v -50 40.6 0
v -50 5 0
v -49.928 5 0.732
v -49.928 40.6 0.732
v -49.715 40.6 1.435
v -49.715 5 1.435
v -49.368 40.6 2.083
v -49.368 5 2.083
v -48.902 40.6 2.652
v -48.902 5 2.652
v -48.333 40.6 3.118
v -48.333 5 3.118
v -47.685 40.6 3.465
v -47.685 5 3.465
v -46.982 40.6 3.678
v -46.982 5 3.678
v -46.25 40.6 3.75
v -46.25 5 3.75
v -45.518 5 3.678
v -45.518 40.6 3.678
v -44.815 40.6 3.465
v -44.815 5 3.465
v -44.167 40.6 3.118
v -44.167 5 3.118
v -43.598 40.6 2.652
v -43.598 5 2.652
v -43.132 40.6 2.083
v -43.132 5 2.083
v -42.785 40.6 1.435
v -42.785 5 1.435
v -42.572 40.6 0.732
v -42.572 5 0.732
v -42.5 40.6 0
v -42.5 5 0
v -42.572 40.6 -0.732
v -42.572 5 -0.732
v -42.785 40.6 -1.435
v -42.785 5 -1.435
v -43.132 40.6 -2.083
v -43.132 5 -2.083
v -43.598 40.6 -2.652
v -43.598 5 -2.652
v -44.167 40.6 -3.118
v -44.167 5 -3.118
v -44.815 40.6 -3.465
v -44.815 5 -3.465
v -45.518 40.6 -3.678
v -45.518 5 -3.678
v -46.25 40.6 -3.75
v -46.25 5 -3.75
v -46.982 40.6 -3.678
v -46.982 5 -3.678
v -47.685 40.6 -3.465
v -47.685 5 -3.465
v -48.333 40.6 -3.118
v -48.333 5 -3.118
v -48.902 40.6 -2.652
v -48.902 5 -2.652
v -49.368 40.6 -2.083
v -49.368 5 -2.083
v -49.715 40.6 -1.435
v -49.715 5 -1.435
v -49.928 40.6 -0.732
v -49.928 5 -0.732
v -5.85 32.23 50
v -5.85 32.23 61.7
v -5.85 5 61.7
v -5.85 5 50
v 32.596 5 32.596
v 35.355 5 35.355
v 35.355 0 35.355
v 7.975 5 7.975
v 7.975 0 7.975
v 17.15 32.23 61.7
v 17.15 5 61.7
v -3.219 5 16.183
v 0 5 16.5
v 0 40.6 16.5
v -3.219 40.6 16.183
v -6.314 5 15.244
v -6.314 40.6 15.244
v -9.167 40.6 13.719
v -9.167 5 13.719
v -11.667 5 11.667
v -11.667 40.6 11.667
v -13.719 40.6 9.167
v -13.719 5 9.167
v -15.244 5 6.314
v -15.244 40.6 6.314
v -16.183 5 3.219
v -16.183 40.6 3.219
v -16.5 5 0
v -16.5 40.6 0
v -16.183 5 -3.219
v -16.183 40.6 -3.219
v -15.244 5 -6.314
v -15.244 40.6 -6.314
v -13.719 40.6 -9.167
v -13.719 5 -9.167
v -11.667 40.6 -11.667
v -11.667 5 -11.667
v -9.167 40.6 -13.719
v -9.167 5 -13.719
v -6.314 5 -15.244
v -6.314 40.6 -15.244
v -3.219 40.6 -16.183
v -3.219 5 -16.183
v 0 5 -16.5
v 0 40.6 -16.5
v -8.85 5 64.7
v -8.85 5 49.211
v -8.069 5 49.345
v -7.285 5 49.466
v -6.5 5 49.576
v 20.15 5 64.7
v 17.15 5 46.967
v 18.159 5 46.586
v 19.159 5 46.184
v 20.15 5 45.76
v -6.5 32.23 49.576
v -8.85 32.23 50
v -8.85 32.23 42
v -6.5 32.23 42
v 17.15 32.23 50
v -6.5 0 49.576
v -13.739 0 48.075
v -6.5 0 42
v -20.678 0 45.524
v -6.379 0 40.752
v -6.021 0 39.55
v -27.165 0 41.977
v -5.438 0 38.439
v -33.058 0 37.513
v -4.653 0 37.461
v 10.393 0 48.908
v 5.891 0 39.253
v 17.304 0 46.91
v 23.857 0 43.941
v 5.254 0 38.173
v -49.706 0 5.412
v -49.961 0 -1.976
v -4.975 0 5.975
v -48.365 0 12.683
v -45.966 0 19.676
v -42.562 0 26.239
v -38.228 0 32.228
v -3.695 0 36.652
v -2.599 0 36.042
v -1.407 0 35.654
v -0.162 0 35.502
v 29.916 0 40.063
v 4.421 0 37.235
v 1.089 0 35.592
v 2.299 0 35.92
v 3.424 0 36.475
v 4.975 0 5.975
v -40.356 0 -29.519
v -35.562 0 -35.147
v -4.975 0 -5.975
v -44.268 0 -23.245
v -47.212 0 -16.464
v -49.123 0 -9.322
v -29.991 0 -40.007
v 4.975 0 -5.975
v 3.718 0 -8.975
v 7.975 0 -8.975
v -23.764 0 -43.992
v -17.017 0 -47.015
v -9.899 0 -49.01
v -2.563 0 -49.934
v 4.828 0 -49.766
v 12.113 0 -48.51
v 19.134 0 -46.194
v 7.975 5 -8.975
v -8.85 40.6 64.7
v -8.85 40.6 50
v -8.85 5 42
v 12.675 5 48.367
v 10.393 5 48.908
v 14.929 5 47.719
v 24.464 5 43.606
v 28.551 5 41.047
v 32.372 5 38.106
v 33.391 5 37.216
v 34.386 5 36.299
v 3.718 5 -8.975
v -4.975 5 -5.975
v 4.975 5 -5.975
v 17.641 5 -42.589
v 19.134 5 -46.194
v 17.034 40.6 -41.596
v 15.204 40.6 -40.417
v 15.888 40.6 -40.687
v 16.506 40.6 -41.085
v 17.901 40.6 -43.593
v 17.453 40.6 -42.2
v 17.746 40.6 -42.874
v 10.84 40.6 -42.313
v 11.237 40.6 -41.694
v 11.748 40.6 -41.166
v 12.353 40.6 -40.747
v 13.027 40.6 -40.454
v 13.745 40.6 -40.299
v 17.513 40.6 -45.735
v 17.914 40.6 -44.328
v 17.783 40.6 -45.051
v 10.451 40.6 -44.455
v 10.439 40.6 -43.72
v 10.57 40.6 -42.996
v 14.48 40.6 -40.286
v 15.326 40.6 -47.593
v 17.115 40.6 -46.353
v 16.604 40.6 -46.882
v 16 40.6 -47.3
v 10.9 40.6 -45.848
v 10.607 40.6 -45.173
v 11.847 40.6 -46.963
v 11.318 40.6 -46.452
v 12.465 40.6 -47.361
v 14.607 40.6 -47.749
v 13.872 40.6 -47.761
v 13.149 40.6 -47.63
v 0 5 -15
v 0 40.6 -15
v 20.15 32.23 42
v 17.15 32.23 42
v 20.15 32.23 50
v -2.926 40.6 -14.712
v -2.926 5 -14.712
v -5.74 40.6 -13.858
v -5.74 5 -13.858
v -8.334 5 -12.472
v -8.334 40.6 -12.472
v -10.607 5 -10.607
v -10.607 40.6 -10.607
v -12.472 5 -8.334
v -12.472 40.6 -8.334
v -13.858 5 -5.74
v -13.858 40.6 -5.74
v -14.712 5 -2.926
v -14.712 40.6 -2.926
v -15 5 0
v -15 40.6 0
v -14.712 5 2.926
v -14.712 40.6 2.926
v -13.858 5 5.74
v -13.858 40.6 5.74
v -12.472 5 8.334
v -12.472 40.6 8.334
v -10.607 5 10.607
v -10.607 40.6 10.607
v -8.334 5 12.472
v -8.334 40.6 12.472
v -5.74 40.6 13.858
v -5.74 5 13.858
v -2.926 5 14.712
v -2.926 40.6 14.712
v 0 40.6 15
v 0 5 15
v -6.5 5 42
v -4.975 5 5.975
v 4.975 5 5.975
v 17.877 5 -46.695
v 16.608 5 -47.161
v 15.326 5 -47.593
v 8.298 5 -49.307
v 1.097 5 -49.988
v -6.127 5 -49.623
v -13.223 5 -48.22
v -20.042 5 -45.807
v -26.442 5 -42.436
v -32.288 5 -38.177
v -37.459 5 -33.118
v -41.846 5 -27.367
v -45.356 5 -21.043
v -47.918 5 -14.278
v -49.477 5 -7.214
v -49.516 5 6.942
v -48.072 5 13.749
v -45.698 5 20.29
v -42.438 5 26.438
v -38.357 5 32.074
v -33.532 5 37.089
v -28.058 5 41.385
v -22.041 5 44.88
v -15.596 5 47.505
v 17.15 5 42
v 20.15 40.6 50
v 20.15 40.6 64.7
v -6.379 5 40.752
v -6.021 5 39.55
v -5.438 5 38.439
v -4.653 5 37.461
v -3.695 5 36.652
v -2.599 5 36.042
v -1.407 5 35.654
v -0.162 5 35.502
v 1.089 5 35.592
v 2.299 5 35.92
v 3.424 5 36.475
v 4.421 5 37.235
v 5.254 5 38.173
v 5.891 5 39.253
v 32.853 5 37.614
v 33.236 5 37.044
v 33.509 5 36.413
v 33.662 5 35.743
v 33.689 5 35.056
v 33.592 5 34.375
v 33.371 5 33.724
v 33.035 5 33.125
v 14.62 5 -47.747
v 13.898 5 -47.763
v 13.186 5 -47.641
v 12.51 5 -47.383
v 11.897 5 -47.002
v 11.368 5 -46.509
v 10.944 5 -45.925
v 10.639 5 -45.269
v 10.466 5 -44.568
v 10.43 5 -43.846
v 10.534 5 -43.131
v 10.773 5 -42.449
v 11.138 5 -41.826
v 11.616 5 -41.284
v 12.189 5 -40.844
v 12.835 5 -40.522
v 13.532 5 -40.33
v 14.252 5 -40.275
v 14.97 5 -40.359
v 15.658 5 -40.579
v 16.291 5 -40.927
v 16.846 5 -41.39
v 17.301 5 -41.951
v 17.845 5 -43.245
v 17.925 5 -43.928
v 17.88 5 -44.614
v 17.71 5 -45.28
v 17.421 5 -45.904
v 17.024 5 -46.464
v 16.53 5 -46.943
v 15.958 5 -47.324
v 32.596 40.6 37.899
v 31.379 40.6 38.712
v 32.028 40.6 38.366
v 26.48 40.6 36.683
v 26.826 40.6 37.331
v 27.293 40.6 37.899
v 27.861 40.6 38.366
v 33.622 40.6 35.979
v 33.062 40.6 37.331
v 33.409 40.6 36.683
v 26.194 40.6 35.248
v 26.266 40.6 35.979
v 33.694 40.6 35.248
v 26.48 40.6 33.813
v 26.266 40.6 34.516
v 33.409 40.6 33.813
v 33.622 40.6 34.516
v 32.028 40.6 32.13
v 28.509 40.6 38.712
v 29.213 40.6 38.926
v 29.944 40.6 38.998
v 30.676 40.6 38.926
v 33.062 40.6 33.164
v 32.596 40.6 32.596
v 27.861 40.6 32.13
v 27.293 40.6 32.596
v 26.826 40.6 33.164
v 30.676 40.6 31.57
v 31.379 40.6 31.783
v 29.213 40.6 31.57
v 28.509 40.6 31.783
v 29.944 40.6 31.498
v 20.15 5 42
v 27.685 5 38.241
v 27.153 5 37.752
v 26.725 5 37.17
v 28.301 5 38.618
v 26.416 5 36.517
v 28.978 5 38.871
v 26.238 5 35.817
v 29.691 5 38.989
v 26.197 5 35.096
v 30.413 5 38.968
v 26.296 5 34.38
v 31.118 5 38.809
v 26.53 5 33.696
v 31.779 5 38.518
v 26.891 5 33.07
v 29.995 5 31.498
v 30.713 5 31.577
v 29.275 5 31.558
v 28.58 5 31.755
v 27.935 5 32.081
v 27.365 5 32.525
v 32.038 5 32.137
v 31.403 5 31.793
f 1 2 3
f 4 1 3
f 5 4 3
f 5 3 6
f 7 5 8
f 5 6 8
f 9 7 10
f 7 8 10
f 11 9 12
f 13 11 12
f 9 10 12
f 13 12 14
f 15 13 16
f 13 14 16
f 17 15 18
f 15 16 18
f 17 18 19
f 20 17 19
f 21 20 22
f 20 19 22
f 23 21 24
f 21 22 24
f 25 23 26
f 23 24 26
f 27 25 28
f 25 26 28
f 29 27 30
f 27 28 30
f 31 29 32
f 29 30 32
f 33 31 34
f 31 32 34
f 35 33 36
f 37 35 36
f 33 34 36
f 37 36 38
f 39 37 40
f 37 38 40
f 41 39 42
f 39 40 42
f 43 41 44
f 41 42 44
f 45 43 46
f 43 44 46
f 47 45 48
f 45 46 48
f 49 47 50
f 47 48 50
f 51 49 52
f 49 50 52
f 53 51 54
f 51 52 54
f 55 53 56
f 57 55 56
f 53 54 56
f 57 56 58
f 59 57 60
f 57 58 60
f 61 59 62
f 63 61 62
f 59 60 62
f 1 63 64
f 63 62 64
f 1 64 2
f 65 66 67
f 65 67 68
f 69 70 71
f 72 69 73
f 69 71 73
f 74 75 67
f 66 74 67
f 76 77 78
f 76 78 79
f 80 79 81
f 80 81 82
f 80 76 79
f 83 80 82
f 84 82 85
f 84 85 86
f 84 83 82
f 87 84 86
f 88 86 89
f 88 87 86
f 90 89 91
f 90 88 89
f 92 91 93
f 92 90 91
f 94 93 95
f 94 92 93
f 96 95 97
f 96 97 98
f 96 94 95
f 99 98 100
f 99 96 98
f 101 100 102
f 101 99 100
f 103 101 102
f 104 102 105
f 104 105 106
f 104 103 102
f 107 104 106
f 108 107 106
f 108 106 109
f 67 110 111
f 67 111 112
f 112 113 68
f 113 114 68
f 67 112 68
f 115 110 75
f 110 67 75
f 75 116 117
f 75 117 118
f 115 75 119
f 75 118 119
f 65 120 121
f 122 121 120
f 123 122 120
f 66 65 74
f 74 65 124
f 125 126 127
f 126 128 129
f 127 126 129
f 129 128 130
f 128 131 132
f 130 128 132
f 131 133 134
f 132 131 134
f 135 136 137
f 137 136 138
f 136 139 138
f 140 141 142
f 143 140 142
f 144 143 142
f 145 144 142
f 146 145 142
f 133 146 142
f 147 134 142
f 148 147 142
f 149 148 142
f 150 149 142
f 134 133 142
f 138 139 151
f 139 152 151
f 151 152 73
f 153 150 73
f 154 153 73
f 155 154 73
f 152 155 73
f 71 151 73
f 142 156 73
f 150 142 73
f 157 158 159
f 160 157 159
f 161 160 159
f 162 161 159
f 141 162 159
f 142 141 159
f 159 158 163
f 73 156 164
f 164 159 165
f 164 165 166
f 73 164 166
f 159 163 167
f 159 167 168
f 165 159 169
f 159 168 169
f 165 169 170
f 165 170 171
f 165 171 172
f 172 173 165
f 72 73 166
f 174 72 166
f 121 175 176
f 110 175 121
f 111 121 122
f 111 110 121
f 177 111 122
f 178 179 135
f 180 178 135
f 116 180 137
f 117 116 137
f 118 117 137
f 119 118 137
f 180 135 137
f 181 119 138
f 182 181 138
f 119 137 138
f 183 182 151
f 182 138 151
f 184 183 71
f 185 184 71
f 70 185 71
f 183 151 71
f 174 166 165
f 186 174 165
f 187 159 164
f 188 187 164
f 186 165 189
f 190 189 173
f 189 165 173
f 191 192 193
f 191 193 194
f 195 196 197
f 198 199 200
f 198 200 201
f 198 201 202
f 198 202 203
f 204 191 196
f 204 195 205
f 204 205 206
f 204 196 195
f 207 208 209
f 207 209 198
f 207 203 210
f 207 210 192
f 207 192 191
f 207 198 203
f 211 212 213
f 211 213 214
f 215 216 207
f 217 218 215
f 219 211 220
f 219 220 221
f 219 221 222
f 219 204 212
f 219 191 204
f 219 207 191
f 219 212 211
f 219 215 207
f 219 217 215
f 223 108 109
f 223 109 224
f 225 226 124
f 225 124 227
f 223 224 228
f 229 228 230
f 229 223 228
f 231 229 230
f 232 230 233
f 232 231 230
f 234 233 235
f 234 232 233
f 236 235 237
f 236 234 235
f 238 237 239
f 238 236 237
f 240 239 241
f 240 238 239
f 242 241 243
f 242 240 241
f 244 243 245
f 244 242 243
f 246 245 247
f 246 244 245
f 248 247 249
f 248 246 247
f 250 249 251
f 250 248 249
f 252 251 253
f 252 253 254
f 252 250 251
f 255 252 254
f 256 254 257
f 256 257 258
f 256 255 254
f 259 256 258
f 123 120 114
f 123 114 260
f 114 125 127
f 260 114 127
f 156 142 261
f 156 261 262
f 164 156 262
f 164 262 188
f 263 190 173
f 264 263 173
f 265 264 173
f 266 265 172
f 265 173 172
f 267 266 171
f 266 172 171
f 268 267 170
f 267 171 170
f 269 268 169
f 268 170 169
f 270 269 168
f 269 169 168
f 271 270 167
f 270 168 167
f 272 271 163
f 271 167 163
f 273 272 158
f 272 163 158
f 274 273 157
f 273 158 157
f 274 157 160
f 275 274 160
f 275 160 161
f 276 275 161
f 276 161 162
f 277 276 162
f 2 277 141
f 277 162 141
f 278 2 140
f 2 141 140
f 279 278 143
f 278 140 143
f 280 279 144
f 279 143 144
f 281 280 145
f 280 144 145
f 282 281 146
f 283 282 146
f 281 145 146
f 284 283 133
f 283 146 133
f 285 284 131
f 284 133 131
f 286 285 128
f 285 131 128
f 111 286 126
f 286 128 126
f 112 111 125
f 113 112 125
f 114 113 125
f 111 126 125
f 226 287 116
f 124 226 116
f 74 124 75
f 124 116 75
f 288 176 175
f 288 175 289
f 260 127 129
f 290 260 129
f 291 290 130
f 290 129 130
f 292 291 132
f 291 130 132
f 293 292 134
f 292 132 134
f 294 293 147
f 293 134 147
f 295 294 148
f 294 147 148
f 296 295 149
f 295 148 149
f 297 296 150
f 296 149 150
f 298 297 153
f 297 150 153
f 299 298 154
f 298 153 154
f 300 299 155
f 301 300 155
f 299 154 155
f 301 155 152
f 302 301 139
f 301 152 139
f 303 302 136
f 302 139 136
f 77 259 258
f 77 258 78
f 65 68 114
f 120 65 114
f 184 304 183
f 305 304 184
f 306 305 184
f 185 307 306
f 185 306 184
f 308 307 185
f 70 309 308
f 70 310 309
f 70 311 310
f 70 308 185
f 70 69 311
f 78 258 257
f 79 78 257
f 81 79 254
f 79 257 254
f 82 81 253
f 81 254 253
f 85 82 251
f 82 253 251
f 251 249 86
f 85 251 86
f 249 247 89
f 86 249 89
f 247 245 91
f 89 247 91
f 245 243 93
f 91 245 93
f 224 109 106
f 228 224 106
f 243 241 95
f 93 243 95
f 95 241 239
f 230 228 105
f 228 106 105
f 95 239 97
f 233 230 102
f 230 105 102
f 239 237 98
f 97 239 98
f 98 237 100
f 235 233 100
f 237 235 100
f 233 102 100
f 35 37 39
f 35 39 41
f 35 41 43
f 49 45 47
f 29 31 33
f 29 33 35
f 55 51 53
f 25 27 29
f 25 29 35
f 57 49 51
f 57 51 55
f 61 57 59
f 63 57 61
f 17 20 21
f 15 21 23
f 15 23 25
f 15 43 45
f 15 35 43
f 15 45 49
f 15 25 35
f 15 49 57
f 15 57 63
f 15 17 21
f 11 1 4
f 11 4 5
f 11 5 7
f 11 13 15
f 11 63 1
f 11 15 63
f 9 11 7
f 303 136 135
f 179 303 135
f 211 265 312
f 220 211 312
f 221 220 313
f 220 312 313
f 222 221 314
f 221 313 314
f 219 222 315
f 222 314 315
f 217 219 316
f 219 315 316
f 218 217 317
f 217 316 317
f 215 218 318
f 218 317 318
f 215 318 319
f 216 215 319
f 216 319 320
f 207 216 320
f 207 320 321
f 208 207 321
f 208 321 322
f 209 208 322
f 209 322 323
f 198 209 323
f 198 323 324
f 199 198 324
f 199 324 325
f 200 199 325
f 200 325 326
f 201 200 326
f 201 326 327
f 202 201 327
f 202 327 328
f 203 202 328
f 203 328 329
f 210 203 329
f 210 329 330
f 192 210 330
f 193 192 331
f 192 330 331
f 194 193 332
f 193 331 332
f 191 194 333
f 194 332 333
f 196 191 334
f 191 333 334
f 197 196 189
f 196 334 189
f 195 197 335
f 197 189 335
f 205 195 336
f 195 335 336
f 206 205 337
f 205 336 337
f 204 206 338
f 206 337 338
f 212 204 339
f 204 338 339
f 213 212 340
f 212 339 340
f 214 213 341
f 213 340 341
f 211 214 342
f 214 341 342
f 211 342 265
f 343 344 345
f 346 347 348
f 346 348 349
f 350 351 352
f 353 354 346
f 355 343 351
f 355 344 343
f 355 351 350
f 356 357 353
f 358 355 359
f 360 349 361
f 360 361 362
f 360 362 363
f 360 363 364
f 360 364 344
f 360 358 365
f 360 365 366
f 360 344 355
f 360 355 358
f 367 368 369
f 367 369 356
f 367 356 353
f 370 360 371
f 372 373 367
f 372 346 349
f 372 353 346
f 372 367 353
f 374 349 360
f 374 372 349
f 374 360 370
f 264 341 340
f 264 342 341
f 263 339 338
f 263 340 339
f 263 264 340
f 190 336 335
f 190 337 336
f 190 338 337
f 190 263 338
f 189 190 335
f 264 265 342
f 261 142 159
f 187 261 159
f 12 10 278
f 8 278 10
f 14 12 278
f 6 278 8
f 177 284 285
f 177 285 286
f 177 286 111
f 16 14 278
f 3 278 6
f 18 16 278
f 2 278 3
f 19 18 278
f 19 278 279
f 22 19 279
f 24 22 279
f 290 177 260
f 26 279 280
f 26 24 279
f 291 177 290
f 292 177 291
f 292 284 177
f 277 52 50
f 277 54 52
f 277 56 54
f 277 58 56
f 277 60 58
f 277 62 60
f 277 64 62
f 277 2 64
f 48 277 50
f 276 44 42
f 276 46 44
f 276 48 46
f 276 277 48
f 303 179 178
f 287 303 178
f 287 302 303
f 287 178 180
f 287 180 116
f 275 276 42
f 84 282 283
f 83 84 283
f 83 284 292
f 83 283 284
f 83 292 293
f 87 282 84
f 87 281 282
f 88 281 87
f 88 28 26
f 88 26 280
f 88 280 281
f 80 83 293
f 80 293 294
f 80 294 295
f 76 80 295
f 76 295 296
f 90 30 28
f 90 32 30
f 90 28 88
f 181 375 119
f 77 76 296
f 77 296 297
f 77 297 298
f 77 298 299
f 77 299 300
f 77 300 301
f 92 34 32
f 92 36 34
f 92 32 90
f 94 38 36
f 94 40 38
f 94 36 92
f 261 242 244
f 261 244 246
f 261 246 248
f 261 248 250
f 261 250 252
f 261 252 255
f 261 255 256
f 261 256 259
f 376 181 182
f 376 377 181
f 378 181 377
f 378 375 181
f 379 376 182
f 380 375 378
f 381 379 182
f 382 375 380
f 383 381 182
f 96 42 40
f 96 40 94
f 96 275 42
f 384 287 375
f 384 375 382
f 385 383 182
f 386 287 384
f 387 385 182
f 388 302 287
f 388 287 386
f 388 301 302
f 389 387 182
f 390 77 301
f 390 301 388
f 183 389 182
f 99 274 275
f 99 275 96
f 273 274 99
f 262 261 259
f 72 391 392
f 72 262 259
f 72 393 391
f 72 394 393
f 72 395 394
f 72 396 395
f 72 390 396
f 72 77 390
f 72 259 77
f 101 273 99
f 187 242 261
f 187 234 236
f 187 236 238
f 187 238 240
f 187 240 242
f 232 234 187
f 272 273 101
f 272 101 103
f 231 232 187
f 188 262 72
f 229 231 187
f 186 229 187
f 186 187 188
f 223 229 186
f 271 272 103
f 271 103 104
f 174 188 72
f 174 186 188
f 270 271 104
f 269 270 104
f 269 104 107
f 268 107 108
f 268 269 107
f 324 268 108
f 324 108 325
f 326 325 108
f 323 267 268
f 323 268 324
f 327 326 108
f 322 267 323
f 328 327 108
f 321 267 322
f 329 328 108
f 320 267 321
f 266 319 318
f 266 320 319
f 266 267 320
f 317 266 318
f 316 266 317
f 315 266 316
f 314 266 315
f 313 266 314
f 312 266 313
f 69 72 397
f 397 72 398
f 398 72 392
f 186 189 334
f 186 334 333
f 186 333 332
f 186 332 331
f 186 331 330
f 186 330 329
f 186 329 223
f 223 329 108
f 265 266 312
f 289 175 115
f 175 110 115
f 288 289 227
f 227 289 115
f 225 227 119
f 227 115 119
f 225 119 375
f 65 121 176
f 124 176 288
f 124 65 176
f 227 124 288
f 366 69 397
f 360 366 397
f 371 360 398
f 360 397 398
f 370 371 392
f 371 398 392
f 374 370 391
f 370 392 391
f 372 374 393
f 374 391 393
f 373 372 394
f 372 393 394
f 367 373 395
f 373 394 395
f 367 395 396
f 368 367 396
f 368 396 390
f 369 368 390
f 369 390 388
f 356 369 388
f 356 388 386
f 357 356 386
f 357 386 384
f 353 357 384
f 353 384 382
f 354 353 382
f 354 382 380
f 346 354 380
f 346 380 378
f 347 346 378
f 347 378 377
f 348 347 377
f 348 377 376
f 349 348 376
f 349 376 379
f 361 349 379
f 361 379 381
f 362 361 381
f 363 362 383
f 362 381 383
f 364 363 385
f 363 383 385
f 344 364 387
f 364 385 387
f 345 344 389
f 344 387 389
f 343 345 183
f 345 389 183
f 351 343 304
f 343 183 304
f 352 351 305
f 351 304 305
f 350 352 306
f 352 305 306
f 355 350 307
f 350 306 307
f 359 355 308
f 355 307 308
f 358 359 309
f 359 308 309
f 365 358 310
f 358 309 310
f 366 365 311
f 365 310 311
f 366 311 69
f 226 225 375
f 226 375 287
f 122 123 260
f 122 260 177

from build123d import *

# Parameters (mm, degrees)
SKETCH1_W           = 9.95
SKETCH1_H           = 11.95
BOSS_EXTRUDE2_DEPTH = 5
BOSS_EXTRUDE4_DEPTH = 27.23
SKETCH3_W           = 29
SKETCH3_H           = 14.7
BOSS_EXTRUDE5_DEPTH = 3
BOSS_EXTRUDE6_DEPTH = 35.6
SKETCH7_W           = 29
SKETCH7_H           = 14.7
BOSS_EXTRUDE7_DEPTH = 5.37
SKETCH8_R           = 3.75
BOSS_EXTRUDE8_DEPTH = 35.6


with BuildPart() as part:
    # Sketch1 → Boss-Extrude2 (new body)
    with BuildSketch(Plane(origin=(0, 0, 0), x_dir=(1, 0, 0), z_dir=(0, 1, 0))):
        with BuildLine():
            Line((35.355339059, -35.355339059), (7.975, -7.975))
            Line((7.975, -7.975), (7.975, 8.975))
            Line((7.975, 8.975), (3.717566722, 8.975))
            Line((3.717566722, 8.975), (19.134171618, 46.193976626))
            ThreePointArc((19.134171618, 46.193976626), (-48.299723588, 12.928136036), (-6.5, -49.575699692))
            Line((-6.5, -49.575699692), (-6.5, -42))
            ThreePointArc((-6.5, -42), (-1.406857491, -35.654075954), (5.891000616, -39.252981299))
            Line((5.891000616, -39.252981299), (10.393160878, -48.907895139))
            ThreePointArc((10.393160878, -48.907895139), (23.856849241, -43.941446771), (35.355339059, -35.355339059))
        make_face()
        Rectangle(SKETCH1_W, SKETCH1_H, mode=Mode.SUBTRACT)
    extrude(amount=BOSS_EXTRUDE2_DEPTH)

    # Sketch2 → Boss-Extrude4 (add)
    with BuildSketch(Plane(origin=(0, 5, 0), x_dir=(1, 0, 0), z_dir=(0, 1, 0))):
        with BuildLine():
            Line((17.15, -61.7), (-5.85, -61.7))
            Line((-5.85, -61.7), (-5.85, -50))
            Line((-5.85, -50), (-6.5, -49.575699692))
            ThreePointArc((-6.5, -49.575699692), (-7.67717135, -49.407095038), (-8.85, -49.21054257))
            Line((-8.85, -49.21054257), (-8.85, -64.7))
            Line((-8.85, -64.7), (20.15, -64.7))
            Line((20.15, -64.7), (20.15, -50))
            Line((20.15, -50), (20.15, -45.759998907))
            ThreePointArc((20.15, -45.759998907), (18.65975815, -46.387643029), (17.15, -46.966770168))
            Line((17.15, -46.966770168), (17.15, -50))
            Line((17.15, -50), (17.15, -61.7))
        make_face()
        with BuildLine():
            ThreePointArc((-8.85, -49.21054257), (-7.67717135, -49.407095038), (-6.5, -49.575699692))
            Line((-6.5, -49.575699692), (-6.5, -42))
            Line((-6.5, -42), (-8.85, -42))
            Line((-8.85, -42), (-8.85, -49.21054257))
        make_face()
        with BuildLine():
            Line((17.15, -42), (17.15, -46.966770168))
            ThreePointArc((17.15, -46.966770168), (18.65975815, -46.387643029), (20.15, -45.759998907))
            Line((20.15, -45.759998907), (20.15, -42))
            Line((20.15, -42), (17.15, -42))
        make_face()
    extrude(amount=BOSS_EXTRUDE4_DEPTH)

    # Sketch3 → Boss-Extrude5 (add)
    with BuildSketch(Plane(origin=(0, 32.23, 0), x_dir=(1, 0, 0), z_dir=(0, 1, 0))):
        with Locations((5.65, -57.35)):
            Rectangle(SKETCH3_W, SKETCH3_H)
    extrude(amount=BOSS_EXTRUDE5_DEPTH)

    # Sketch4 → Boss-Extrude6 (add)
    with BuildSketch(Plane(origin=(0, 5, 0), x_dir=(1, 0, 0), z_dir=(0, 1, 0))):
        with BuildLine():
            Line((0, 16.5), (0, 15))
            ThreePointArc((0, 15), (-15, 0), (0, -15))
            Line((0, -15), (0, -16.5))
            ThreePointArc((0, -16.5), (-16.5, 0), (0, 16.5))
        make_face()
    extrude(amount=BOSS_EXTRUDE6_DEPTH)

    # Sketch7 → Boss-Extrude7 (add)
    with BuildSketch(Plane(origin=(0, 35.23, 0), x_dir=(1, 0, 0), z_dir=(0, 1, 0))):
        with Locations((5.65, -57.35)):
            Rectangle(SKETCH7_W, SKETCH7_H)
    extrude(amount=BOSS_EXTRUDE7_DEPTH)

    # Sketch8 → Boss-Extrude8 (add)
    with BuildSketch(Plane(origin=(0, 5, 0), x_dir=(1, 0, 0), z_dir=(0, 1, 0))):
        with Locations(Location((14.176286342, 44.023804987, 0), (0, 0, 72.150709005))):
            Circle(SKETCH8_R)
        with Locations(Location((29.944361597, -35.247662455, 0), (0, 0, 45))):
            Circle(SKETCH8_R)
        with Locations(Location((-46.25, 0, 0), (0, 0, 179.999564815))):
            Circle(SKETCH8_R)
    extrude(amount=BOSS_EXTRUDE8_DEPTH)


solid = part.part
